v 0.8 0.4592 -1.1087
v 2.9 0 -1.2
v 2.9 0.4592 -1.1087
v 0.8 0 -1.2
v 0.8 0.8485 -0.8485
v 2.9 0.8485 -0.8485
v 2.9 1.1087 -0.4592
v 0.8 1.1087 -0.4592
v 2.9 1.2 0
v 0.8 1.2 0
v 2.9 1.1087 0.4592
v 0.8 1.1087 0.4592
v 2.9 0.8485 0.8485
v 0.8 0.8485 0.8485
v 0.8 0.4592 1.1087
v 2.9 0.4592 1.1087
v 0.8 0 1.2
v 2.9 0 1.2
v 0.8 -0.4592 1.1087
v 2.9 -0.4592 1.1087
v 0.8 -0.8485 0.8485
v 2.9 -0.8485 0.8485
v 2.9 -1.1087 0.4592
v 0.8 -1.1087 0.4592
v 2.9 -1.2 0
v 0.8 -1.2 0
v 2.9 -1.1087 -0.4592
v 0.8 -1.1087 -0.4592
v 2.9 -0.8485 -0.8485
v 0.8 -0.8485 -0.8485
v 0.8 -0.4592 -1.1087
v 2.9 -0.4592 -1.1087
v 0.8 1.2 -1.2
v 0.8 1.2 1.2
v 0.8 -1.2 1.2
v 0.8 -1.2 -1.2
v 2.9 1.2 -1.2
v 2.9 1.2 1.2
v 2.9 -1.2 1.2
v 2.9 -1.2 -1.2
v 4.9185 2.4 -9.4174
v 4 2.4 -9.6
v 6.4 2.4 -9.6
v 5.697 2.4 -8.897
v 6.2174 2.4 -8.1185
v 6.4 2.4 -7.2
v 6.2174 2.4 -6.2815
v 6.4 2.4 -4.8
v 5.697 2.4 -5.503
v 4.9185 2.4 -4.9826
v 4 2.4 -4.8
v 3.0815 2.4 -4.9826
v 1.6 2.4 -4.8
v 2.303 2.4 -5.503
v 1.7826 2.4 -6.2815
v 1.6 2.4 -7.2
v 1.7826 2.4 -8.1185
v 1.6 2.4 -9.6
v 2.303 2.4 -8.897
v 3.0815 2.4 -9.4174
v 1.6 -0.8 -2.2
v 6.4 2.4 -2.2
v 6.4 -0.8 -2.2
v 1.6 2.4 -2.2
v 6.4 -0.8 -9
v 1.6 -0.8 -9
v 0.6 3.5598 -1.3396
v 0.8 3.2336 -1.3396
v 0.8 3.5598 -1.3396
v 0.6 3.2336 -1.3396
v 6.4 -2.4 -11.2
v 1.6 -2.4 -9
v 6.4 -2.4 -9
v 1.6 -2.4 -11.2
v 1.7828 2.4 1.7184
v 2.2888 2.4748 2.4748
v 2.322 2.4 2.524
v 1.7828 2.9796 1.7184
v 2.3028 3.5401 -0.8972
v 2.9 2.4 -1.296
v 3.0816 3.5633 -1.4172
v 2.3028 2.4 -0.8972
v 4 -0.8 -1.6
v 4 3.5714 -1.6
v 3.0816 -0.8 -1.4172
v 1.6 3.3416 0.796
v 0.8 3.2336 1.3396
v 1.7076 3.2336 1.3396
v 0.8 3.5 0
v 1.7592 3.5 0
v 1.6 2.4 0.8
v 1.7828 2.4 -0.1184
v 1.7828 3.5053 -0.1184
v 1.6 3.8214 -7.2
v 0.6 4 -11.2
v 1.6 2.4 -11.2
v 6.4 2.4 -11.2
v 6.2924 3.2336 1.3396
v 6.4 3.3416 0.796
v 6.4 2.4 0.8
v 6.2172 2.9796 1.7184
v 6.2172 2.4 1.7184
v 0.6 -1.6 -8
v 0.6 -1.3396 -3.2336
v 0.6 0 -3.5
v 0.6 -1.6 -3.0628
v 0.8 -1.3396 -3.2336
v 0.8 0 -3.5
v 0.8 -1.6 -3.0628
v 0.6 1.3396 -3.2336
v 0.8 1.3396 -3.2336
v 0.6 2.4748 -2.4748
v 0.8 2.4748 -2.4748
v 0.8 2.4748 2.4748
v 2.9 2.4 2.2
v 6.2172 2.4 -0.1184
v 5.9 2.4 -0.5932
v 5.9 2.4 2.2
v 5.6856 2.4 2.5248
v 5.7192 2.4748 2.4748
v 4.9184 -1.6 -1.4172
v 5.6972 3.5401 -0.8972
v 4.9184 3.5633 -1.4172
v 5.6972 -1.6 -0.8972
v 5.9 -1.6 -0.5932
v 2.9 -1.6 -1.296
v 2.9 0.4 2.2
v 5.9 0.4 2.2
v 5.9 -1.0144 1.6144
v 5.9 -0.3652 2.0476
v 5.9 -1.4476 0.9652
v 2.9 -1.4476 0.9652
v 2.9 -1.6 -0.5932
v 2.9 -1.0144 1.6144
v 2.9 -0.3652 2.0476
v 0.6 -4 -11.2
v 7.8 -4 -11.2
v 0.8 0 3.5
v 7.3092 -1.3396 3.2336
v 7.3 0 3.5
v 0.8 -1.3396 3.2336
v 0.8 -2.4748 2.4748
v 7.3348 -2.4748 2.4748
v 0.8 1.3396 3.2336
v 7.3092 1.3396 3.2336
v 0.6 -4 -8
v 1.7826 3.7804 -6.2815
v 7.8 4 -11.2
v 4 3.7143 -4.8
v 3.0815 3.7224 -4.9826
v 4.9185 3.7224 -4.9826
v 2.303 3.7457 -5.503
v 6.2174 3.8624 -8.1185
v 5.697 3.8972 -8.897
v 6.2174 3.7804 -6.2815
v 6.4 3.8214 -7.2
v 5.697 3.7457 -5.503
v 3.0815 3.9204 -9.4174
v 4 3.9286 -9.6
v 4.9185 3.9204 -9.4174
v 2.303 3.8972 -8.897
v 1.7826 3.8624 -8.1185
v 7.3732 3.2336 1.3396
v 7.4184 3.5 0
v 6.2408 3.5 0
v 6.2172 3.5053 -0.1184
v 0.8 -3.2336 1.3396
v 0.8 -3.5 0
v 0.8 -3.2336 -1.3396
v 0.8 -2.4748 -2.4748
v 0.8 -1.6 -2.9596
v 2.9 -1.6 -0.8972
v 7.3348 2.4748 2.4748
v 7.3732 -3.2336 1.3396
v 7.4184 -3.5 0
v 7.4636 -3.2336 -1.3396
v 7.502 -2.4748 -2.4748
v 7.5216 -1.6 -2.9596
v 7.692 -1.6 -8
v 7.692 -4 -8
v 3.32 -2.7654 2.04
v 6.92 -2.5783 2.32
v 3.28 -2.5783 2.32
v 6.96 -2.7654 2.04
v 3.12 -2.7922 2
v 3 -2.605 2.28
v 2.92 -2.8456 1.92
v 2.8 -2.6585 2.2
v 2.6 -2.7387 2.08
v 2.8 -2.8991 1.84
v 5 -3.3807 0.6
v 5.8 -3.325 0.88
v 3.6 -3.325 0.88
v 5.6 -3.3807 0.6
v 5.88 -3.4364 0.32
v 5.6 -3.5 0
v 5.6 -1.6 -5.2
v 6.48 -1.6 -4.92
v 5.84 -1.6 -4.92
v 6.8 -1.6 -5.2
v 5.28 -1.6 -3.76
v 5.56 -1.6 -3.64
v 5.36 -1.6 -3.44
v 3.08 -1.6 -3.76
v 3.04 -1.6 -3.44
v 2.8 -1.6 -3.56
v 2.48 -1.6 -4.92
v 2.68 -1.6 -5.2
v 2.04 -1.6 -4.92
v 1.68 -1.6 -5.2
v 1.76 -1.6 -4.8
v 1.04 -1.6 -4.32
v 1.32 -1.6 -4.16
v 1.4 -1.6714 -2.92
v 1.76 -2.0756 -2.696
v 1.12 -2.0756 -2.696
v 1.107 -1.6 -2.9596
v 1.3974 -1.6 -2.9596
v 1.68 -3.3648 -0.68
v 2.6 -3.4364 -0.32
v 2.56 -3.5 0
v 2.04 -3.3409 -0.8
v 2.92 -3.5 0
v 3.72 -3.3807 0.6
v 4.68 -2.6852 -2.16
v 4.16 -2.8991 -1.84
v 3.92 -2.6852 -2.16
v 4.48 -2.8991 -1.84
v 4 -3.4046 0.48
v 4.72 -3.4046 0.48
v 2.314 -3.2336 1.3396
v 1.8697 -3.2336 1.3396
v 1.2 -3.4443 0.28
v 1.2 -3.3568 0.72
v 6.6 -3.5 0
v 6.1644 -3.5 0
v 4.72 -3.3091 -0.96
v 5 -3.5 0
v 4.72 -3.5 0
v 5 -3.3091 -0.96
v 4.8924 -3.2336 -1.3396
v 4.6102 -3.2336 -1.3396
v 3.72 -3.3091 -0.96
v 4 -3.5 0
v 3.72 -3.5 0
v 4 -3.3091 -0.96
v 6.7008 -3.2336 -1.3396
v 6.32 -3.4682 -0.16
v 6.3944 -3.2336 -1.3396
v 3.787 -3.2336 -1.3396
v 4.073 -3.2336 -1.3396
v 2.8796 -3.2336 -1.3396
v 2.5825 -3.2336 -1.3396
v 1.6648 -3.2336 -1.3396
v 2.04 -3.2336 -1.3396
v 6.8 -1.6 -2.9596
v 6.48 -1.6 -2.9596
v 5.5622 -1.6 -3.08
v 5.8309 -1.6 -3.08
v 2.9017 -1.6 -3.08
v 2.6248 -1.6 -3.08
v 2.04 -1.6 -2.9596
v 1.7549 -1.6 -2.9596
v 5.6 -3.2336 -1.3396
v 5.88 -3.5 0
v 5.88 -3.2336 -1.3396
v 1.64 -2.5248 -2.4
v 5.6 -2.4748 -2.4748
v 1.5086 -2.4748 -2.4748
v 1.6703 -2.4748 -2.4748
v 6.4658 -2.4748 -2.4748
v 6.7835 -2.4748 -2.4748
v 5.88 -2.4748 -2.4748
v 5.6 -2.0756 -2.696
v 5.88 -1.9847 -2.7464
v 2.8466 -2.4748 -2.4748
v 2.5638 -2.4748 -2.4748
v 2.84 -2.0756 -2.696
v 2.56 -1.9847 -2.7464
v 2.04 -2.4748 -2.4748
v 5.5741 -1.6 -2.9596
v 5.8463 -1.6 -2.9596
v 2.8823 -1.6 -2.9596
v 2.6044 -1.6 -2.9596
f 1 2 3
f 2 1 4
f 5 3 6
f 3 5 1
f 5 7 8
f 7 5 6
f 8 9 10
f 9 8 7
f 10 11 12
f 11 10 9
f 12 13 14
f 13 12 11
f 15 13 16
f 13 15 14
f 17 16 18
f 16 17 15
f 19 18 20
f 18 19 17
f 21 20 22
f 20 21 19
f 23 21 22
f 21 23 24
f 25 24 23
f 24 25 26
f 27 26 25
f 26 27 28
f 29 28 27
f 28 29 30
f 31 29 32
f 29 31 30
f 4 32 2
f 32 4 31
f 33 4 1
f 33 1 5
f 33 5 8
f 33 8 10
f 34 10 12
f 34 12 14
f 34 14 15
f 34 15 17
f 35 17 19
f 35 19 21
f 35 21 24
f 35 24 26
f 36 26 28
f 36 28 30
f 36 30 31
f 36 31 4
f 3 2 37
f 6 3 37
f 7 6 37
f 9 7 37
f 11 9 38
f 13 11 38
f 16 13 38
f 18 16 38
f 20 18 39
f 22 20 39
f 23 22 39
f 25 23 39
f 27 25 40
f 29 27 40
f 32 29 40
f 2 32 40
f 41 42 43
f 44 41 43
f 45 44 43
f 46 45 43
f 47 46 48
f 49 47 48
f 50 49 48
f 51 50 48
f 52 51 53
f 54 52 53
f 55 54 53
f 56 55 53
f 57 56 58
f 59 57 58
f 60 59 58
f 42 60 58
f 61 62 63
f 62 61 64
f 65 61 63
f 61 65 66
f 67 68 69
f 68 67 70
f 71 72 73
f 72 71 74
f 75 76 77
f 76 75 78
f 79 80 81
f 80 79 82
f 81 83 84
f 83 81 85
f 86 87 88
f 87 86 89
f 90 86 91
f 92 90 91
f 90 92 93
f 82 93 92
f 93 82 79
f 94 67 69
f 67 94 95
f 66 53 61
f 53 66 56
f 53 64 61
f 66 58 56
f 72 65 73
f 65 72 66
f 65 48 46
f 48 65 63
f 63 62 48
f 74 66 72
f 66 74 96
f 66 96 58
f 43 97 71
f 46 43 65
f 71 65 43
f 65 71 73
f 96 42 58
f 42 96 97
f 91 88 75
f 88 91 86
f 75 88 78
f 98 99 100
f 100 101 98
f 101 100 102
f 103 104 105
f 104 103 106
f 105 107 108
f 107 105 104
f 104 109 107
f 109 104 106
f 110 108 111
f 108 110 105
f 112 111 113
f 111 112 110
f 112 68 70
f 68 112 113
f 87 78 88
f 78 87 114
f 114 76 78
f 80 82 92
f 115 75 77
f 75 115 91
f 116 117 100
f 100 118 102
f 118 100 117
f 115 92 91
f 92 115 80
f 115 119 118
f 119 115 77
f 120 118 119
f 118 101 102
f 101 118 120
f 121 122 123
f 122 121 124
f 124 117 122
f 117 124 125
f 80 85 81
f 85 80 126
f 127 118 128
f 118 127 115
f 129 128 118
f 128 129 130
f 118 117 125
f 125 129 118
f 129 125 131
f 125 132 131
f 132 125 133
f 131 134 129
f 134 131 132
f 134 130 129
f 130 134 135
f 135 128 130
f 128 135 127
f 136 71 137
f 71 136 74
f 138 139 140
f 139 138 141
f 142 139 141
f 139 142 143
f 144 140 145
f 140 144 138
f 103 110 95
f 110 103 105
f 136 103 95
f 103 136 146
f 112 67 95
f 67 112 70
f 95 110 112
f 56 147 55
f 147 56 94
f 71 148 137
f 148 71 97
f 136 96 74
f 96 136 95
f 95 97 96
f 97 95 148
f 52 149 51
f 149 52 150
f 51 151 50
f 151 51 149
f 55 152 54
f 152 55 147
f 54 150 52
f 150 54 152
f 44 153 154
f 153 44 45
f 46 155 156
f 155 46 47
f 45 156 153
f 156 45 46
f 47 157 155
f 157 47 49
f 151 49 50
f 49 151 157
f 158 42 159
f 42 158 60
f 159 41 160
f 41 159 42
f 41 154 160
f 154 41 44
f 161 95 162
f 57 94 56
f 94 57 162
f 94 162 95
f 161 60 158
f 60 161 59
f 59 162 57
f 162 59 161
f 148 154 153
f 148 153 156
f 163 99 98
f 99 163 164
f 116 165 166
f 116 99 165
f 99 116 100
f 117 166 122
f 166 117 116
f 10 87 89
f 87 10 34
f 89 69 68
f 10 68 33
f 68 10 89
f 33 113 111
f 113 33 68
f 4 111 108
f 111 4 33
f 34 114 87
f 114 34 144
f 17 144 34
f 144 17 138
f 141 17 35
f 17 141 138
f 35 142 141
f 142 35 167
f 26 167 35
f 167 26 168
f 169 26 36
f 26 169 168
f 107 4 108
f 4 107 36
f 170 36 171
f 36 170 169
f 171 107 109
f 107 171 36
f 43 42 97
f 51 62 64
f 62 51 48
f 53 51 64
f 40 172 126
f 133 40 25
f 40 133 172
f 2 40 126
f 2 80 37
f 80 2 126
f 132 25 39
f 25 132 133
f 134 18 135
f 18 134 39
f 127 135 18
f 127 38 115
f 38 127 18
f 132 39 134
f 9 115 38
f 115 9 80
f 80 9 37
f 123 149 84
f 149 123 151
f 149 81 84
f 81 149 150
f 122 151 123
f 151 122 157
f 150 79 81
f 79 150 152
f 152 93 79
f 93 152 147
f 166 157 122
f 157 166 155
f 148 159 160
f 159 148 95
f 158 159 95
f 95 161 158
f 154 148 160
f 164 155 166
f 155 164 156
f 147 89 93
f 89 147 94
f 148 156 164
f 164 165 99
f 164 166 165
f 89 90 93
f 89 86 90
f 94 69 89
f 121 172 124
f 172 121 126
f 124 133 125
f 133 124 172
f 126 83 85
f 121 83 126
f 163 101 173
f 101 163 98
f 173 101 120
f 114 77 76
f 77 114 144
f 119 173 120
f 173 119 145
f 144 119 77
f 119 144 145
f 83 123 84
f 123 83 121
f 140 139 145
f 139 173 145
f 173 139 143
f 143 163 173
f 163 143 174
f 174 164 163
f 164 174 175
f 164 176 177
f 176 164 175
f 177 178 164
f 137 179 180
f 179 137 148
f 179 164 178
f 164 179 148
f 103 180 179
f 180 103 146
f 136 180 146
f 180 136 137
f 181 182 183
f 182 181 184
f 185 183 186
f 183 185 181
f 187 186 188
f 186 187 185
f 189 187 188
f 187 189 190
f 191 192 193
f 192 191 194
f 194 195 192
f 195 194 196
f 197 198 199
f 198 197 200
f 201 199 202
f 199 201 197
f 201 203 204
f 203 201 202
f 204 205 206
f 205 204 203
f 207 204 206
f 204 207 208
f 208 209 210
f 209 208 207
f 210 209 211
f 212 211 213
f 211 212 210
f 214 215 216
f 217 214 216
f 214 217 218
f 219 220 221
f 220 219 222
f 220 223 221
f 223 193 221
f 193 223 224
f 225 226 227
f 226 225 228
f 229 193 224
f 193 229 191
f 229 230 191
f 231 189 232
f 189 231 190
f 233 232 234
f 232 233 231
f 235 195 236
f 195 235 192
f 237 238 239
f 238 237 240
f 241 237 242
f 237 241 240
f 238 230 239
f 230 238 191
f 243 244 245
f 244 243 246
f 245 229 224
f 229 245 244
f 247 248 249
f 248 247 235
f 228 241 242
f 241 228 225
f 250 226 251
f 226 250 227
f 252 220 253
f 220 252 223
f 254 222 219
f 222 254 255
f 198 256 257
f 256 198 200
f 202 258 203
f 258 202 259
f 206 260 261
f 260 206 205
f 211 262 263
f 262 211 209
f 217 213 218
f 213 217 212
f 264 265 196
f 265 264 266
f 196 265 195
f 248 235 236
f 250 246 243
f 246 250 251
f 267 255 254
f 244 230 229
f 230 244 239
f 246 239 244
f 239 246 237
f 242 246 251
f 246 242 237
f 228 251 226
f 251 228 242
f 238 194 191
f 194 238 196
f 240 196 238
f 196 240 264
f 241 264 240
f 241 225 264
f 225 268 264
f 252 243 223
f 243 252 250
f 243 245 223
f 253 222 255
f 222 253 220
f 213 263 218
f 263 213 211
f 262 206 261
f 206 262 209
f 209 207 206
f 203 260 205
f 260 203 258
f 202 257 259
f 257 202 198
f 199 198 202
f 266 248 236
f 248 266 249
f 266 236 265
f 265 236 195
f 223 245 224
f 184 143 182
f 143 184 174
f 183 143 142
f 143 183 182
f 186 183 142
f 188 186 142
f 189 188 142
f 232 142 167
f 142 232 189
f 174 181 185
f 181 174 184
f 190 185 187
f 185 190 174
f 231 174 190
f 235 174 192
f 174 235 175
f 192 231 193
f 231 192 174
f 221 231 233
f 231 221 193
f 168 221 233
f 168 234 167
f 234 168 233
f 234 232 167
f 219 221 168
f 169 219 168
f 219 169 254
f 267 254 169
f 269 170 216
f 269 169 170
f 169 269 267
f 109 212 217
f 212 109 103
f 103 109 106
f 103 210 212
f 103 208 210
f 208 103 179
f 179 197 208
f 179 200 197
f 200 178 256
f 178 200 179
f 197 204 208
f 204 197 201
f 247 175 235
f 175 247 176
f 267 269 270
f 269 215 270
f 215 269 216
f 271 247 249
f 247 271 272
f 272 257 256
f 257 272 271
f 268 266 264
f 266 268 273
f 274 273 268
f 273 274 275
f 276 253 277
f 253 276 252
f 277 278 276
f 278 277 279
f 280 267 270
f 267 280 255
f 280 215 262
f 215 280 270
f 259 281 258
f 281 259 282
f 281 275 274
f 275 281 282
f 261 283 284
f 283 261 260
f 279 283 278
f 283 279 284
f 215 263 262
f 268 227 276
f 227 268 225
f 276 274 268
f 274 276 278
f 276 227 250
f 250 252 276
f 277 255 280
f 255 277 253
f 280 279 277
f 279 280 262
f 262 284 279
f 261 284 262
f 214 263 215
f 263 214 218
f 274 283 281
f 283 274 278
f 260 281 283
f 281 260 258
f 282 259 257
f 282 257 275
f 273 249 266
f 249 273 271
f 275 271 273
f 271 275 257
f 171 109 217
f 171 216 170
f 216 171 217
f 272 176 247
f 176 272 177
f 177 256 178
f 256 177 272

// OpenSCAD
use <../lib.scad>
use <3816bpbc.scad>
function ldraw_lib__3817bpbc() = [
// 0 ~Minifig Leg Left with Iron Man Armoured Suit Mark VII Pattern (Obsolete)
// 0 Name: 3817bpbc.dat
// 0 Author: Magnus Forsberg [MagFors]
// 0 !LDRAW_ORG Part UPDATE 2023-03
// 0 !LICENSE Licensed under CC BY 4.0 : see CAreadme.txt
// 
// 0 BFC CERTIFY CCW
  [0,"BFC","CERTIFY"],
  [0,"BFC","CCW"],
// 
// 0 !CATEGORY Obsolete
// 0 !KEYWORDS Bricklink 970c00pb0155, set 10721, set 6869
// 
// 0 !HISTORY 2013-12-23 [MagFors] Original design as 3815c89
// 0 !HISTORY 2020-06-18 [MagFors] Adapted to corrected geometry
// 0 !HISTORY 2020-12-29 [PTadmin] Official Update 2020-03
// 0 !HISTORY 2023-06-01 [Holly-Wood] Obsoleted due to bad geometry
// 0 !HISTORY 2023-06-24 [OrionP] Official Update 2023-03
// 
// 
// 1 16 0 0 0 -1 0 0 0 1 0 0 0 1 3816bpbc.dat
  [1,16,0,0,0,-1,0,0,0,1,0,0,0,1, ldraw_lib__3816bpbc()],
];
module ldraw_lib__3817bpbc(step=0, col=false, unit=2/5, alt=false, line=0.2, solid=!$preview)
    makepoly(ldraw_lib__3817bpbc(), step=step, col=col, unit=unit, alt=alt, line=line, solid=solid);
ldraw_lib__3817bpbc(line=0.2);
